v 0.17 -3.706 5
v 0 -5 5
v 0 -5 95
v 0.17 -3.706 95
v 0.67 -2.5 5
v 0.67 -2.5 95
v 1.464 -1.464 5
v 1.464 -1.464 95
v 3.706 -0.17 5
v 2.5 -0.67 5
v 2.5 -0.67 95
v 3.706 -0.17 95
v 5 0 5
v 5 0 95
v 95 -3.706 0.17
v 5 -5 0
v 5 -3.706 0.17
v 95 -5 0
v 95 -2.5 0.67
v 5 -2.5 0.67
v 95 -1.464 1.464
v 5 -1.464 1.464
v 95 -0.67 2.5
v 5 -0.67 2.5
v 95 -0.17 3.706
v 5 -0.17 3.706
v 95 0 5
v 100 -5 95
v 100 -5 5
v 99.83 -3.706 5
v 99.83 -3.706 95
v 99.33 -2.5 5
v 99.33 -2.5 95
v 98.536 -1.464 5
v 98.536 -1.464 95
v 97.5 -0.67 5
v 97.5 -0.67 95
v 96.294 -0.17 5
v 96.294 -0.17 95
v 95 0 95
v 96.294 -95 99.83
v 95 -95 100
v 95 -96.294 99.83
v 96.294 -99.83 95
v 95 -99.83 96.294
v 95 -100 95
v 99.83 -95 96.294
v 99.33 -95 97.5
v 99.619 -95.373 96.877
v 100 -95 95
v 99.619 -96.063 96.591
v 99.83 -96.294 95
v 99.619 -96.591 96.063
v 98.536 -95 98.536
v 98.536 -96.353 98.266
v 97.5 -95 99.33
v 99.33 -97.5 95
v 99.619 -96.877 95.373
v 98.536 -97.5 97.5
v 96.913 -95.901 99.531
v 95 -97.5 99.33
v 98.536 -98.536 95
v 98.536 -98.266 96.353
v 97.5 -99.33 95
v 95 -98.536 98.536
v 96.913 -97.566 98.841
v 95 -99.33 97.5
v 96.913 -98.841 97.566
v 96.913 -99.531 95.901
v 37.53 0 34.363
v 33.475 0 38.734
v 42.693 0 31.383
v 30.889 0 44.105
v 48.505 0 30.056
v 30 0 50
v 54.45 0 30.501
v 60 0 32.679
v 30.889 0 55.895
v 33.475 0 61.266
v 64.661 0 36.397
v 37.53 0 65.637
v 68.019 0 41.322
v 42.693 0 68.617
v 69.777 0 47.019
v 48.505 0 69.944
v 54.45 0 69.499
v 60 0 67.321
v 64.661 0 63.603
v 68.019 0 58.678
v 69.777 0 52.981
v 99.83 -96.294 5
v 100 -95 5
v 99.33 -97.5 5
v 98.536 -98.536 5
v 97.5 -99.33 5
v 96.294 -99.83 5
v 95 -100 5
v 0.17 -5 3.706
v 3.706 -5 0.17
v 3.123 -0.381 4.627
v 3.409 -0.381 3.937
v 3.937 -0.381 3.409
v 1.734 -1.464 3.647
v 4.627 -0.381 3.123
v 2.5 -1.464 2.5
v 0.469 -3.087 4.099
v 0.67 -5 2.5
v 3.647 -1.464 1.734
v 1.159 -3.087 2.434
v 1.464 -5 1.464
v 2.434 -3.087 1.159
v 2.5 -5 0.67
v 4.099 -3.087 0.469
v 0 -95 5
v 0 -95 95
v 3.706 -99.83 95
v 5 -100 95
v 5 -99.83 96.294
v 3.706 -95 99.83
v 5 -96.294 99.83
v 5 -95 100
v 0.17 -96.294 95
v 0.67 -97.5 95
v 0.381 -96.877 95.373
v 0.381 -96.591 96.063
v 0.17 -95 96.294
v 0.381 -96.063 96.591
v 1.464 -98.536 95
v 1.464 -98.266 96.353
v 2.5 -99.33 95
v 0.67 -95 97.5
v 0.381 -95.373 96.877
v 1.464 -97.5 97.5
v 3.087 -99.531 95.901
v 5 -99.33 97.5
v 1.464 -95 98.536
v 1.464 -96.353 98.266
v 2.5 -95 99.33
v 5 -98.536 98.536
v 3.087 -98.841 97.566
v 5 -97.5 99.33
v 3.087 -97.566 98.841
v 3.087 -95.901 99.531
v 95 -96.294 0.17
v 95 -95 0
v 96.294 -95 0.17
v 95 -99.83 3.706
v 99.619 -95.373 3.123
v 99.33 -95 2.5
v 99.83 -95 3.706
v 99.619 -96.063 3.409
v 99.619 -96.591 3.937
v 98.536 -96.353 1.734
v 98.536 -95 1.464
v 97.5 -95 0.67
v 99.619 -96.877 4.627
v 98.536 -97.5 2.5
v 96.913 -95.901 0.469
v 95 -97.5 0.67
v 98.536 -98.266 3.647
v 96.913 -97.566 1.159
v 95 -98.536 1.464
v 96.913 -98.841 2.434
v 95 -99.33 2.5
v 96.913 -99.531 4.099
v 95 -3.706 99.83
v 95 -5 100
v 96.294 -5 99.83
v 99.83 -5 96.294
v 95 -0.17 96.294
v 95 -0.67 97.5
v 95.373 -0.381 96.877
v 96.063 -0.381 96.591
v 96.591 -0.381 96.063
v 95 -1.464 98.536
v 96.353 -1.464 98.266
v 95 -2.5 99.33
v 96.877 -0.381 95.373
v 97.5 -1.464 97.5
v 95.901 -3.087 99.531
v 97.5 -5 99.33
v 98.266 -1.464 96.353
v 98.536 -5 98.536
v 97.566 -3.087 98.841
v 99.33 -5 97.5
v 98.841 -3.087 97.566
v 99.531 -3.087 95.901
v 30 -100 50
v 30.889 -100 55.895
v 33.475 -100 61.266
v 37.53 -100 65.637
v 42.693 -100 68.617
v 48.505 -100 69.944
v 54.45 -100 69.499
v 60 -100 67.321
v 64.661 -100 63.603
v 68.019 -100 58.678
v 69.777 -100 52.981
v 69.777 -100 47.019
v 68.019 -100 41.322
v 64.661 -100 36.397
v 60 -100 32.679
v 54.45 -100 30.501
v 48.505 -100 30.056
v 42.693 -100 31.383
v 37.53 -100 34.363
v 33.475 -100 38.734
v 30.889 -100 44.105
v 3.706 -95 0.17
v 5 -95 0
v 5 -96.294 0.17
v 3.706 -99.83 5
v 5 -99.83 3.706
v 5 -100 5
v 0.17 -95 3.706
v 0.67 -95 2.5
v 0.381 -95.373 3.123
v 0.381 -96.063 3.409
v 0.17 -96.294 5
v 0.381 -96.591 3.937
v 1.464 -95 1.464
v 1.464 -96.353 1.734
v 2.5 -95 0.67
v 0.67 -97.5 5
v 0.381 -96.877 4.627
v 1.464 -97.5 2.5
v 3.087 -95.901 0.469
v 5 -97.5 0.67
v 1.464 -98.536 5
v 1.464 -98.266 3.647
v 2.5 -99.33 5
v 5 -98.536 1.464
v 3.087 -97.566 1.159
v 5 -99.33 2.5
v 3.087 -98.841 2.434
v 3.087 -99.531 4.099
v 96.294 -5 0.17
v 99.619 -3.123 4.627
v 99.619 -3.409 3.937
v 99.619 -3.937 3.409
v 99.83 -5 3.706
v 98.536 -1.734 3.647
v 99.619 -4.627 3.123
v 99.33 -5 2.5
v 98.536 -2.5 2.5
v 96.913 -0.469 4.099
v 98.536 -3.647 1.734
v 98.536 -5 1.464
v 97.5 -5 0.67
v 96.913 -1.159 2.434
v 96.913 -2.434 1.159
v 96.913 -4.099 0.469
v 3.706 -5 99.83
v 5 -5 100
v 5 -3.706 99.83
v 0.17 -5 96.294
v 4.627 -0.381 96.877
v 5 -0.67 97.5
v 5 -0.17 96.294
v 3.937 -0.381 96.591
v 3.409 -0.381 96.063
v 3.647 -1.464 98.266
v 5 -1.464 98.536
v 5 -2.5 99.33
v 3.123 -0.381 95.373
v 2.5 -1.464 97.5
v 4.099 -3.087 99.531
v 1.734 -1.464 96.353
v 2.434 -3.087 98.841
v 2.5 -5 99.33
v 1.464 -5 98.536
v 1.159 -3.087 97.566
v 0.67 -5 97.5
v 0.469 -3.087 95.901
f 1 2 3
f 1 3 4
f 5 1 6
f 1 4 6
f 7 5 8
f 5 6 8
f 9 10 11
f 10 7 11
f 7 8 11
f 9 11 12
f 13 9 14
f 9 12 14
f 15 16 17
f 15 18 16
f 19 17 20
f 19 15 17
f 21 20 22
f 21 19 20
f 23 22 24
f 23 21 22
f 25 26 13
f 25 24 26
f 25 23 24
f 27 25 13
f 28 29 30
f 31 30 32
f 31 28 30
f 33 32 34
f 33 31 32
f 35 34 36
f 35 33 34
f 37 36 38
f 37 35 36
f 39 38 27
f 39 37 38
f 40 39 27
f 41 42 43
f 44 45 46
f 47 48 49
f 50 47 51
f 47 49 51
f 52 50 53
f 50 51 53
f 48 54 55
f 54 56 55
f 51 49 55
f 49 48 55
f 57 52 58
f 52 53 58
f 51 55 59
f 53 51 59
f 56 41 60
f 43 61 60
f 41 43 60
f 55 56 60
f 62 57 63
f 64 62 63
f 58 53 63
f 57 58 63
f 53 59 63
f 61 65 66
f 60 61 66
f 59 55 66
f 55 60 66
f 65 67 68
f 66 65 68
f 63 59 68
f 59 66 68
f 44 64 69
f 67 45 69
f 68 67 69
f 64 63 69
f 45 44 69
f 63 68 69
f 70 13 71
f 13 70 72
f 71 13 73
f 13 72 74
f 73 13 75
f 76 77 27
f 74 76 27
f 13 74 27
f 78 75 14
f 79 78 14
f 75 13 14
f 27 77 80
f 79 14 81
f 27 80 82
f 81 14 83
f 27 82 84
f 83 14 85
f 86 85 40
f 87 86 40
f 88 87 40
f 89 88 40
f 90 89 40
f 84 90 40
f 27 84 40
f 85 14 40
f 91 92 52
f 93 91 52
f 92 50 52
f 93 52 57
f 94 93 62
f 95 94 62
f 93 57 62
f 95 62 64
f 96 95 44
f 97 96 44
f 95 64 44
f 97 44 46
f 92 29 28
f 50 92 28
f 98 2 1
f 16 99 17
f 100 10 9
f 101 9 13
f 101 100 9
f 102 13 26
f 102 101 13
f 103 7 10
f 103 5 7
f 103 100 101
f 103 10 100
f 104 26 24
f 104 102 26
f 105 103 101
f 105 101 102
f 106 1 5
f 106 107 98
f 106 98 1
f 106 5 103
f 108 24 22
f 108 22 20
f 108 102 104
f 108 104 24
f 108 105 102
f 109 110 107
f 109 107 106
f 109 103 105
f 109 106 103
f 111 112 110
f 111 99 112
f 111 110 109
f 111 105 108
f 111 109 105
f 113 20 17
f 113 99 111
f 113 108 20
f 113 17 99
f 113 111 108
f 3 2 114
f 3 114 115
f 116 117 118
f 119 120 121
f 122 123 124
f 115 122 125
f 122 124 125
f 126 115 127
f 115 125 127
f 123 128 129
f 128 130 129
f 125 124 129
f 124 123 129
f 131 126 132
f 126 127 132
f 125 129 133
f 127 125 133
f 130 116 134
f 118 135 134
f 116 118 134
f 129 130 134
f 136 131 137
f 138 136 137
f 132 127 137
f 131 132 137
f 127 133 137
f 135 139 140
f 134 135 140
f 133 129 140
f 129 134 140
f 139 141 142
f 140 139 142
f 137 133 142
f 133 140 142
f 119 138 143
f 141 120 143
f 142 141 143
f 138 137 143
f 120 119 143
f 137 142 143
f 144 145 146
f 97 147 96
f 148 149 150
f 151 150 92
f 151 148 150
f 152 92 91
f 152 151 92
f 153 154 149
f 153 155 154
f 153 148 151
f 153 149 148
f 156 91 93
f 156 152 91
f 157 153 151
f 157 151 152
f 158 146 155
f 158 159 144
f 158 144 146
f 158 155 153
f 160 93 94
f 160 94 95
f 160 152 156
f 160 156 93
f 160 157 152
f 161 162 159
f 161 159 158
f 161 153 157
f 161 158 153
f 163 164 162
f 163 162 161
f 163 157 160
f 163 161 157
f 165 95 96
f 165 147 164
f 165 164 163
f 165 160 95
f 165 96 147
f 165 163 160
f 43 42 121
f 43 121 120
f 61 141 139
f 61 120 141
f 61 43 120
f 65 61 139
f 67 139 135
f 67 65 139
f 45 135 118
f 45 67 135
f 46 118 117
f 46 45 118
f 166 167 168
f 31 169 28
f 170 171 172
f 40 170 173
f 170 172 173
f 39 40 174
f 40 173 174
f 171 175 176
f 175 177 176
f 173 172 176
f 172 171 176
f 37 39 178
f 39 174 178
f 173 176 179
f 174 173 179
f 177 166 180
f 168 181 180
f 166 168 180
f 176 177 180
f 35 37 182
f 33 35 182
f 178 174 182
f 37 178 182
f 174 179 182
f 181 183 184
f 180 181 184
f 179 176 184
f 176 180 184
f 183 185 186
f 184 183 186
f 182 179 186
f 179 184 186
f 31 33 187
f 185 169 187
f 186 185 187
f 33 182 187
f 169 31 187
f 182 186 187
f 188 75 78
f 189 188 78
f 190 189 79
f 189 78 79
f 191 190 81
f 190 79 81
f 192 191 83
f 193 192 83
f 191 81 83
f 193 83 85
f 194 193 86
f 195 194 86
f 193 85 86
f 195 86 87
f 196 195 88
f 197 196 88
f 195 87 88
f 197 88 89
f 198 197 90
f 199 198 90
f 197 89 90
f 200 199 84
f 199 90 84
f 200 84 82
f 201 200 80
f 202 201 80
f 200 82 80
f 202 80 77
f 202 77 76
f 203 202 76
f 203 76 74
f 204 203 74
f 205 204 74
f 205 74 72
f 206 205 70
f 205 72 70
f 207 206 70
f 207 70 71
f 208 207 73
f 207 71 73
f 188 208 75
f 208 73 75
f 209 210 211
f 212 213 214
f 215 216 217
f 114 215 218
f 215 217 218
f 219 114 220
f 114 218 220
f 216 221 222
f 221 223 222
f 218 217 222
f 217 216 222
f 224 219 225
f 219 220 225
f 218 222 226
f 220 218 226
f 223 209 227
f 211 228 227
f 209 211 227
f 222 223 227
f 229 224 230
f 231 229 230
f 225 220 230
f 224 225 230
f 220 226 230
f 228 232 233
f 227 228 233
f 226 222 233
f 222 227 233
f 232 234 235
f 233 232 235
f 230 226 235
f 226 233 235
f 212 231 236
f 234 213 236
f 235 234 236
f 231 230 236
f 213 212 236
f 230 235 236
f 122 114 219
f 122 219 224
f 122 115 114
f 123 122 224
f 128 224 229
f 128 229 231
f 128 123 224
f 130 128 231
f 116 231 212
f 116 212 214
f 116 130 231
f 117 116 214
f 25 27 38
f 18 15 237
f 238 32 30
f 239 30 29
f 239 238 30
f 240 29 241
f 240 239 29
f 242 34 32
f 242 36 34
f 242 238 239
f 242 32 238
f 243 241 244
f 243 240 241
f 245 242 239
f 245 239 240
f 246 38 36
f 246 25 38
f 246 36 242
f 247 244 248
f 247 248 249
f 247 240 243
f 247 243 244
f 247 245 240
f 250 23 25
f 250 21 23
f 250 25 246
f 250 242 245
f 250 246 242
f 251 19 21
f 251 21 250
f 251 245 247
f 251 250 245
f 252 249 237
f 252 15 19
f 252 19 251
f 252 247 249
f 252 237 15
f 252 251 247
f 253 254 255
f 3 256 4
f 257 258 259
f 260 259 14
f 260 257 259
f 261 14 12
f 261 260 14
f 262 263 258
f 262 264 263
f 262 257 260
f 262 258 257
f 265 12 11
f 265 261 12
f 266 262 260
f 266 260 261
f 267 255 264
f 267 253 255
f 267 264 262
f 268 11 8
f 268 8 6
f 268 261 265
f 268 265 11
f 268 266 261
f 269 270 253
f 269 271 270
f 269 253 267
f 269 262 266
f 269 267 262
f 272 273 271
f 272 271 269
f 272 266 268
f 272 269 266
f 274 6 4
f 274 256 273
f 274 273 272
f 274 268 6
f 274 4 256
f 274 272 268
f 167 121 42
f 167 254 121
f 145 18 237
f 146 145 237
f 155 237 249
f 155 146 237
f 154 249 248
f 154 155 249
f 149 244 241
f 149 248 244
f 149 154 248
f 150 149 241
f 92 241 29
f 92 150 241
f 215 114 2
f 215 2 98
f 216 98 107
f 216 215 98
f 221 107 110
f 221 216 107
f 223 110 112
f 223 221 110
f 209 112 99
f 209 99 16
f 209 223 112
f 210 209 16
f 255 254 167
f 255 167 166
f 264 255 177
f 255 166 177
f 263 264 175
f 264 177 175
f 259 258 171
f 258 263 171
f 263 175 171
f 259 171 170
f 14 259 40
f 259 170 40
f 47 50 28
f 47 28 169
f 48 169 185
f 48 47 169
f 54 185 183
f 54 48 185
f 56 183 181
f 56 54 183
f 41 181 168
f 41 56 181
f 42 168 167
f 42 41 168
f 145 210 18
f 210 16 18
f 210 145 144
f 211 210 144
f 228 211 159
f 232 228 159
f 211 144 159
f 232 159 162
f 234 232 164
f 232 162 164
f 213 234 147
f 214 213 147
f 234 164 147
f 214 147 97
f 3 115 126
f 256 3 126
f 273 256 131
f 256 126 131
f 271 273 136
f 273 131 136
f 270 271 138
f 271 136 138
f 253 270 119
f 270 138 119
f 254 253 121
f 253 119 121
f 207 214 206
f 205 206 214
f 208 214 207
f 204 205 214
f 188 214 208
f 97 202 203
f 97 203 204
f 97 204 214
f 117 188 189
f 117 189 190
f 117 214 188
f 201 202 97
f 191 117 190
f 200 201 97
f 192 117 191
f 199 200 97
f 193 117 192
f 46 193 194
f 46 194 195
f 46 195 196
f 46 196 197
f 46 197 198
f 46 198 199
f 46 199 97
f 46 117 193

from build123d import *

# Parameters (mm, degrees)
F0_W     = 100
F0_H     = 100
F1_DEPTH = 100
F2_R     = 5
F3_R     = 20
F4_DEPTH = 100


with BuildPart() as f1:
    # F0 (on Front) → F1 (new body)
    with BuildSketch(Plane.XZ):
        with Locations((50, 50)):
            Rectangle(F0_W, F0_H)
    extrude(amount=F1_DEPTH)

    # F2
    f2_edges = [f1.edges().sort_by_distance(p)[0] for p in [
        (50, -100, 100),
        (50, -100, 0),
        (0, -50, 0),
        (0, -100, 50),
        (0, -50, 100),
        (100, -50, 100),
        (50, 0, 100),
        (0, 0, 50),
        (50, 0, 0),
        (100, 0, 50),
        (100, -50, 0),
        (100, -100, 50),
    ]]
    fillet(f2_edges, radius=F2_R)

    # F3 (on face) → F4 (cut)
    with BuildSketch(Plane(origin=(0, 0, 0), x_dir=(-1, 0, 0), z_dir=(0, 1, 0))):
        with Locations((-50, 50)):
            Circle(F3_R)
    extrude(amount=-F4_DEPTH, mode=Mode.SUBTRACT)


solid = f1.part
